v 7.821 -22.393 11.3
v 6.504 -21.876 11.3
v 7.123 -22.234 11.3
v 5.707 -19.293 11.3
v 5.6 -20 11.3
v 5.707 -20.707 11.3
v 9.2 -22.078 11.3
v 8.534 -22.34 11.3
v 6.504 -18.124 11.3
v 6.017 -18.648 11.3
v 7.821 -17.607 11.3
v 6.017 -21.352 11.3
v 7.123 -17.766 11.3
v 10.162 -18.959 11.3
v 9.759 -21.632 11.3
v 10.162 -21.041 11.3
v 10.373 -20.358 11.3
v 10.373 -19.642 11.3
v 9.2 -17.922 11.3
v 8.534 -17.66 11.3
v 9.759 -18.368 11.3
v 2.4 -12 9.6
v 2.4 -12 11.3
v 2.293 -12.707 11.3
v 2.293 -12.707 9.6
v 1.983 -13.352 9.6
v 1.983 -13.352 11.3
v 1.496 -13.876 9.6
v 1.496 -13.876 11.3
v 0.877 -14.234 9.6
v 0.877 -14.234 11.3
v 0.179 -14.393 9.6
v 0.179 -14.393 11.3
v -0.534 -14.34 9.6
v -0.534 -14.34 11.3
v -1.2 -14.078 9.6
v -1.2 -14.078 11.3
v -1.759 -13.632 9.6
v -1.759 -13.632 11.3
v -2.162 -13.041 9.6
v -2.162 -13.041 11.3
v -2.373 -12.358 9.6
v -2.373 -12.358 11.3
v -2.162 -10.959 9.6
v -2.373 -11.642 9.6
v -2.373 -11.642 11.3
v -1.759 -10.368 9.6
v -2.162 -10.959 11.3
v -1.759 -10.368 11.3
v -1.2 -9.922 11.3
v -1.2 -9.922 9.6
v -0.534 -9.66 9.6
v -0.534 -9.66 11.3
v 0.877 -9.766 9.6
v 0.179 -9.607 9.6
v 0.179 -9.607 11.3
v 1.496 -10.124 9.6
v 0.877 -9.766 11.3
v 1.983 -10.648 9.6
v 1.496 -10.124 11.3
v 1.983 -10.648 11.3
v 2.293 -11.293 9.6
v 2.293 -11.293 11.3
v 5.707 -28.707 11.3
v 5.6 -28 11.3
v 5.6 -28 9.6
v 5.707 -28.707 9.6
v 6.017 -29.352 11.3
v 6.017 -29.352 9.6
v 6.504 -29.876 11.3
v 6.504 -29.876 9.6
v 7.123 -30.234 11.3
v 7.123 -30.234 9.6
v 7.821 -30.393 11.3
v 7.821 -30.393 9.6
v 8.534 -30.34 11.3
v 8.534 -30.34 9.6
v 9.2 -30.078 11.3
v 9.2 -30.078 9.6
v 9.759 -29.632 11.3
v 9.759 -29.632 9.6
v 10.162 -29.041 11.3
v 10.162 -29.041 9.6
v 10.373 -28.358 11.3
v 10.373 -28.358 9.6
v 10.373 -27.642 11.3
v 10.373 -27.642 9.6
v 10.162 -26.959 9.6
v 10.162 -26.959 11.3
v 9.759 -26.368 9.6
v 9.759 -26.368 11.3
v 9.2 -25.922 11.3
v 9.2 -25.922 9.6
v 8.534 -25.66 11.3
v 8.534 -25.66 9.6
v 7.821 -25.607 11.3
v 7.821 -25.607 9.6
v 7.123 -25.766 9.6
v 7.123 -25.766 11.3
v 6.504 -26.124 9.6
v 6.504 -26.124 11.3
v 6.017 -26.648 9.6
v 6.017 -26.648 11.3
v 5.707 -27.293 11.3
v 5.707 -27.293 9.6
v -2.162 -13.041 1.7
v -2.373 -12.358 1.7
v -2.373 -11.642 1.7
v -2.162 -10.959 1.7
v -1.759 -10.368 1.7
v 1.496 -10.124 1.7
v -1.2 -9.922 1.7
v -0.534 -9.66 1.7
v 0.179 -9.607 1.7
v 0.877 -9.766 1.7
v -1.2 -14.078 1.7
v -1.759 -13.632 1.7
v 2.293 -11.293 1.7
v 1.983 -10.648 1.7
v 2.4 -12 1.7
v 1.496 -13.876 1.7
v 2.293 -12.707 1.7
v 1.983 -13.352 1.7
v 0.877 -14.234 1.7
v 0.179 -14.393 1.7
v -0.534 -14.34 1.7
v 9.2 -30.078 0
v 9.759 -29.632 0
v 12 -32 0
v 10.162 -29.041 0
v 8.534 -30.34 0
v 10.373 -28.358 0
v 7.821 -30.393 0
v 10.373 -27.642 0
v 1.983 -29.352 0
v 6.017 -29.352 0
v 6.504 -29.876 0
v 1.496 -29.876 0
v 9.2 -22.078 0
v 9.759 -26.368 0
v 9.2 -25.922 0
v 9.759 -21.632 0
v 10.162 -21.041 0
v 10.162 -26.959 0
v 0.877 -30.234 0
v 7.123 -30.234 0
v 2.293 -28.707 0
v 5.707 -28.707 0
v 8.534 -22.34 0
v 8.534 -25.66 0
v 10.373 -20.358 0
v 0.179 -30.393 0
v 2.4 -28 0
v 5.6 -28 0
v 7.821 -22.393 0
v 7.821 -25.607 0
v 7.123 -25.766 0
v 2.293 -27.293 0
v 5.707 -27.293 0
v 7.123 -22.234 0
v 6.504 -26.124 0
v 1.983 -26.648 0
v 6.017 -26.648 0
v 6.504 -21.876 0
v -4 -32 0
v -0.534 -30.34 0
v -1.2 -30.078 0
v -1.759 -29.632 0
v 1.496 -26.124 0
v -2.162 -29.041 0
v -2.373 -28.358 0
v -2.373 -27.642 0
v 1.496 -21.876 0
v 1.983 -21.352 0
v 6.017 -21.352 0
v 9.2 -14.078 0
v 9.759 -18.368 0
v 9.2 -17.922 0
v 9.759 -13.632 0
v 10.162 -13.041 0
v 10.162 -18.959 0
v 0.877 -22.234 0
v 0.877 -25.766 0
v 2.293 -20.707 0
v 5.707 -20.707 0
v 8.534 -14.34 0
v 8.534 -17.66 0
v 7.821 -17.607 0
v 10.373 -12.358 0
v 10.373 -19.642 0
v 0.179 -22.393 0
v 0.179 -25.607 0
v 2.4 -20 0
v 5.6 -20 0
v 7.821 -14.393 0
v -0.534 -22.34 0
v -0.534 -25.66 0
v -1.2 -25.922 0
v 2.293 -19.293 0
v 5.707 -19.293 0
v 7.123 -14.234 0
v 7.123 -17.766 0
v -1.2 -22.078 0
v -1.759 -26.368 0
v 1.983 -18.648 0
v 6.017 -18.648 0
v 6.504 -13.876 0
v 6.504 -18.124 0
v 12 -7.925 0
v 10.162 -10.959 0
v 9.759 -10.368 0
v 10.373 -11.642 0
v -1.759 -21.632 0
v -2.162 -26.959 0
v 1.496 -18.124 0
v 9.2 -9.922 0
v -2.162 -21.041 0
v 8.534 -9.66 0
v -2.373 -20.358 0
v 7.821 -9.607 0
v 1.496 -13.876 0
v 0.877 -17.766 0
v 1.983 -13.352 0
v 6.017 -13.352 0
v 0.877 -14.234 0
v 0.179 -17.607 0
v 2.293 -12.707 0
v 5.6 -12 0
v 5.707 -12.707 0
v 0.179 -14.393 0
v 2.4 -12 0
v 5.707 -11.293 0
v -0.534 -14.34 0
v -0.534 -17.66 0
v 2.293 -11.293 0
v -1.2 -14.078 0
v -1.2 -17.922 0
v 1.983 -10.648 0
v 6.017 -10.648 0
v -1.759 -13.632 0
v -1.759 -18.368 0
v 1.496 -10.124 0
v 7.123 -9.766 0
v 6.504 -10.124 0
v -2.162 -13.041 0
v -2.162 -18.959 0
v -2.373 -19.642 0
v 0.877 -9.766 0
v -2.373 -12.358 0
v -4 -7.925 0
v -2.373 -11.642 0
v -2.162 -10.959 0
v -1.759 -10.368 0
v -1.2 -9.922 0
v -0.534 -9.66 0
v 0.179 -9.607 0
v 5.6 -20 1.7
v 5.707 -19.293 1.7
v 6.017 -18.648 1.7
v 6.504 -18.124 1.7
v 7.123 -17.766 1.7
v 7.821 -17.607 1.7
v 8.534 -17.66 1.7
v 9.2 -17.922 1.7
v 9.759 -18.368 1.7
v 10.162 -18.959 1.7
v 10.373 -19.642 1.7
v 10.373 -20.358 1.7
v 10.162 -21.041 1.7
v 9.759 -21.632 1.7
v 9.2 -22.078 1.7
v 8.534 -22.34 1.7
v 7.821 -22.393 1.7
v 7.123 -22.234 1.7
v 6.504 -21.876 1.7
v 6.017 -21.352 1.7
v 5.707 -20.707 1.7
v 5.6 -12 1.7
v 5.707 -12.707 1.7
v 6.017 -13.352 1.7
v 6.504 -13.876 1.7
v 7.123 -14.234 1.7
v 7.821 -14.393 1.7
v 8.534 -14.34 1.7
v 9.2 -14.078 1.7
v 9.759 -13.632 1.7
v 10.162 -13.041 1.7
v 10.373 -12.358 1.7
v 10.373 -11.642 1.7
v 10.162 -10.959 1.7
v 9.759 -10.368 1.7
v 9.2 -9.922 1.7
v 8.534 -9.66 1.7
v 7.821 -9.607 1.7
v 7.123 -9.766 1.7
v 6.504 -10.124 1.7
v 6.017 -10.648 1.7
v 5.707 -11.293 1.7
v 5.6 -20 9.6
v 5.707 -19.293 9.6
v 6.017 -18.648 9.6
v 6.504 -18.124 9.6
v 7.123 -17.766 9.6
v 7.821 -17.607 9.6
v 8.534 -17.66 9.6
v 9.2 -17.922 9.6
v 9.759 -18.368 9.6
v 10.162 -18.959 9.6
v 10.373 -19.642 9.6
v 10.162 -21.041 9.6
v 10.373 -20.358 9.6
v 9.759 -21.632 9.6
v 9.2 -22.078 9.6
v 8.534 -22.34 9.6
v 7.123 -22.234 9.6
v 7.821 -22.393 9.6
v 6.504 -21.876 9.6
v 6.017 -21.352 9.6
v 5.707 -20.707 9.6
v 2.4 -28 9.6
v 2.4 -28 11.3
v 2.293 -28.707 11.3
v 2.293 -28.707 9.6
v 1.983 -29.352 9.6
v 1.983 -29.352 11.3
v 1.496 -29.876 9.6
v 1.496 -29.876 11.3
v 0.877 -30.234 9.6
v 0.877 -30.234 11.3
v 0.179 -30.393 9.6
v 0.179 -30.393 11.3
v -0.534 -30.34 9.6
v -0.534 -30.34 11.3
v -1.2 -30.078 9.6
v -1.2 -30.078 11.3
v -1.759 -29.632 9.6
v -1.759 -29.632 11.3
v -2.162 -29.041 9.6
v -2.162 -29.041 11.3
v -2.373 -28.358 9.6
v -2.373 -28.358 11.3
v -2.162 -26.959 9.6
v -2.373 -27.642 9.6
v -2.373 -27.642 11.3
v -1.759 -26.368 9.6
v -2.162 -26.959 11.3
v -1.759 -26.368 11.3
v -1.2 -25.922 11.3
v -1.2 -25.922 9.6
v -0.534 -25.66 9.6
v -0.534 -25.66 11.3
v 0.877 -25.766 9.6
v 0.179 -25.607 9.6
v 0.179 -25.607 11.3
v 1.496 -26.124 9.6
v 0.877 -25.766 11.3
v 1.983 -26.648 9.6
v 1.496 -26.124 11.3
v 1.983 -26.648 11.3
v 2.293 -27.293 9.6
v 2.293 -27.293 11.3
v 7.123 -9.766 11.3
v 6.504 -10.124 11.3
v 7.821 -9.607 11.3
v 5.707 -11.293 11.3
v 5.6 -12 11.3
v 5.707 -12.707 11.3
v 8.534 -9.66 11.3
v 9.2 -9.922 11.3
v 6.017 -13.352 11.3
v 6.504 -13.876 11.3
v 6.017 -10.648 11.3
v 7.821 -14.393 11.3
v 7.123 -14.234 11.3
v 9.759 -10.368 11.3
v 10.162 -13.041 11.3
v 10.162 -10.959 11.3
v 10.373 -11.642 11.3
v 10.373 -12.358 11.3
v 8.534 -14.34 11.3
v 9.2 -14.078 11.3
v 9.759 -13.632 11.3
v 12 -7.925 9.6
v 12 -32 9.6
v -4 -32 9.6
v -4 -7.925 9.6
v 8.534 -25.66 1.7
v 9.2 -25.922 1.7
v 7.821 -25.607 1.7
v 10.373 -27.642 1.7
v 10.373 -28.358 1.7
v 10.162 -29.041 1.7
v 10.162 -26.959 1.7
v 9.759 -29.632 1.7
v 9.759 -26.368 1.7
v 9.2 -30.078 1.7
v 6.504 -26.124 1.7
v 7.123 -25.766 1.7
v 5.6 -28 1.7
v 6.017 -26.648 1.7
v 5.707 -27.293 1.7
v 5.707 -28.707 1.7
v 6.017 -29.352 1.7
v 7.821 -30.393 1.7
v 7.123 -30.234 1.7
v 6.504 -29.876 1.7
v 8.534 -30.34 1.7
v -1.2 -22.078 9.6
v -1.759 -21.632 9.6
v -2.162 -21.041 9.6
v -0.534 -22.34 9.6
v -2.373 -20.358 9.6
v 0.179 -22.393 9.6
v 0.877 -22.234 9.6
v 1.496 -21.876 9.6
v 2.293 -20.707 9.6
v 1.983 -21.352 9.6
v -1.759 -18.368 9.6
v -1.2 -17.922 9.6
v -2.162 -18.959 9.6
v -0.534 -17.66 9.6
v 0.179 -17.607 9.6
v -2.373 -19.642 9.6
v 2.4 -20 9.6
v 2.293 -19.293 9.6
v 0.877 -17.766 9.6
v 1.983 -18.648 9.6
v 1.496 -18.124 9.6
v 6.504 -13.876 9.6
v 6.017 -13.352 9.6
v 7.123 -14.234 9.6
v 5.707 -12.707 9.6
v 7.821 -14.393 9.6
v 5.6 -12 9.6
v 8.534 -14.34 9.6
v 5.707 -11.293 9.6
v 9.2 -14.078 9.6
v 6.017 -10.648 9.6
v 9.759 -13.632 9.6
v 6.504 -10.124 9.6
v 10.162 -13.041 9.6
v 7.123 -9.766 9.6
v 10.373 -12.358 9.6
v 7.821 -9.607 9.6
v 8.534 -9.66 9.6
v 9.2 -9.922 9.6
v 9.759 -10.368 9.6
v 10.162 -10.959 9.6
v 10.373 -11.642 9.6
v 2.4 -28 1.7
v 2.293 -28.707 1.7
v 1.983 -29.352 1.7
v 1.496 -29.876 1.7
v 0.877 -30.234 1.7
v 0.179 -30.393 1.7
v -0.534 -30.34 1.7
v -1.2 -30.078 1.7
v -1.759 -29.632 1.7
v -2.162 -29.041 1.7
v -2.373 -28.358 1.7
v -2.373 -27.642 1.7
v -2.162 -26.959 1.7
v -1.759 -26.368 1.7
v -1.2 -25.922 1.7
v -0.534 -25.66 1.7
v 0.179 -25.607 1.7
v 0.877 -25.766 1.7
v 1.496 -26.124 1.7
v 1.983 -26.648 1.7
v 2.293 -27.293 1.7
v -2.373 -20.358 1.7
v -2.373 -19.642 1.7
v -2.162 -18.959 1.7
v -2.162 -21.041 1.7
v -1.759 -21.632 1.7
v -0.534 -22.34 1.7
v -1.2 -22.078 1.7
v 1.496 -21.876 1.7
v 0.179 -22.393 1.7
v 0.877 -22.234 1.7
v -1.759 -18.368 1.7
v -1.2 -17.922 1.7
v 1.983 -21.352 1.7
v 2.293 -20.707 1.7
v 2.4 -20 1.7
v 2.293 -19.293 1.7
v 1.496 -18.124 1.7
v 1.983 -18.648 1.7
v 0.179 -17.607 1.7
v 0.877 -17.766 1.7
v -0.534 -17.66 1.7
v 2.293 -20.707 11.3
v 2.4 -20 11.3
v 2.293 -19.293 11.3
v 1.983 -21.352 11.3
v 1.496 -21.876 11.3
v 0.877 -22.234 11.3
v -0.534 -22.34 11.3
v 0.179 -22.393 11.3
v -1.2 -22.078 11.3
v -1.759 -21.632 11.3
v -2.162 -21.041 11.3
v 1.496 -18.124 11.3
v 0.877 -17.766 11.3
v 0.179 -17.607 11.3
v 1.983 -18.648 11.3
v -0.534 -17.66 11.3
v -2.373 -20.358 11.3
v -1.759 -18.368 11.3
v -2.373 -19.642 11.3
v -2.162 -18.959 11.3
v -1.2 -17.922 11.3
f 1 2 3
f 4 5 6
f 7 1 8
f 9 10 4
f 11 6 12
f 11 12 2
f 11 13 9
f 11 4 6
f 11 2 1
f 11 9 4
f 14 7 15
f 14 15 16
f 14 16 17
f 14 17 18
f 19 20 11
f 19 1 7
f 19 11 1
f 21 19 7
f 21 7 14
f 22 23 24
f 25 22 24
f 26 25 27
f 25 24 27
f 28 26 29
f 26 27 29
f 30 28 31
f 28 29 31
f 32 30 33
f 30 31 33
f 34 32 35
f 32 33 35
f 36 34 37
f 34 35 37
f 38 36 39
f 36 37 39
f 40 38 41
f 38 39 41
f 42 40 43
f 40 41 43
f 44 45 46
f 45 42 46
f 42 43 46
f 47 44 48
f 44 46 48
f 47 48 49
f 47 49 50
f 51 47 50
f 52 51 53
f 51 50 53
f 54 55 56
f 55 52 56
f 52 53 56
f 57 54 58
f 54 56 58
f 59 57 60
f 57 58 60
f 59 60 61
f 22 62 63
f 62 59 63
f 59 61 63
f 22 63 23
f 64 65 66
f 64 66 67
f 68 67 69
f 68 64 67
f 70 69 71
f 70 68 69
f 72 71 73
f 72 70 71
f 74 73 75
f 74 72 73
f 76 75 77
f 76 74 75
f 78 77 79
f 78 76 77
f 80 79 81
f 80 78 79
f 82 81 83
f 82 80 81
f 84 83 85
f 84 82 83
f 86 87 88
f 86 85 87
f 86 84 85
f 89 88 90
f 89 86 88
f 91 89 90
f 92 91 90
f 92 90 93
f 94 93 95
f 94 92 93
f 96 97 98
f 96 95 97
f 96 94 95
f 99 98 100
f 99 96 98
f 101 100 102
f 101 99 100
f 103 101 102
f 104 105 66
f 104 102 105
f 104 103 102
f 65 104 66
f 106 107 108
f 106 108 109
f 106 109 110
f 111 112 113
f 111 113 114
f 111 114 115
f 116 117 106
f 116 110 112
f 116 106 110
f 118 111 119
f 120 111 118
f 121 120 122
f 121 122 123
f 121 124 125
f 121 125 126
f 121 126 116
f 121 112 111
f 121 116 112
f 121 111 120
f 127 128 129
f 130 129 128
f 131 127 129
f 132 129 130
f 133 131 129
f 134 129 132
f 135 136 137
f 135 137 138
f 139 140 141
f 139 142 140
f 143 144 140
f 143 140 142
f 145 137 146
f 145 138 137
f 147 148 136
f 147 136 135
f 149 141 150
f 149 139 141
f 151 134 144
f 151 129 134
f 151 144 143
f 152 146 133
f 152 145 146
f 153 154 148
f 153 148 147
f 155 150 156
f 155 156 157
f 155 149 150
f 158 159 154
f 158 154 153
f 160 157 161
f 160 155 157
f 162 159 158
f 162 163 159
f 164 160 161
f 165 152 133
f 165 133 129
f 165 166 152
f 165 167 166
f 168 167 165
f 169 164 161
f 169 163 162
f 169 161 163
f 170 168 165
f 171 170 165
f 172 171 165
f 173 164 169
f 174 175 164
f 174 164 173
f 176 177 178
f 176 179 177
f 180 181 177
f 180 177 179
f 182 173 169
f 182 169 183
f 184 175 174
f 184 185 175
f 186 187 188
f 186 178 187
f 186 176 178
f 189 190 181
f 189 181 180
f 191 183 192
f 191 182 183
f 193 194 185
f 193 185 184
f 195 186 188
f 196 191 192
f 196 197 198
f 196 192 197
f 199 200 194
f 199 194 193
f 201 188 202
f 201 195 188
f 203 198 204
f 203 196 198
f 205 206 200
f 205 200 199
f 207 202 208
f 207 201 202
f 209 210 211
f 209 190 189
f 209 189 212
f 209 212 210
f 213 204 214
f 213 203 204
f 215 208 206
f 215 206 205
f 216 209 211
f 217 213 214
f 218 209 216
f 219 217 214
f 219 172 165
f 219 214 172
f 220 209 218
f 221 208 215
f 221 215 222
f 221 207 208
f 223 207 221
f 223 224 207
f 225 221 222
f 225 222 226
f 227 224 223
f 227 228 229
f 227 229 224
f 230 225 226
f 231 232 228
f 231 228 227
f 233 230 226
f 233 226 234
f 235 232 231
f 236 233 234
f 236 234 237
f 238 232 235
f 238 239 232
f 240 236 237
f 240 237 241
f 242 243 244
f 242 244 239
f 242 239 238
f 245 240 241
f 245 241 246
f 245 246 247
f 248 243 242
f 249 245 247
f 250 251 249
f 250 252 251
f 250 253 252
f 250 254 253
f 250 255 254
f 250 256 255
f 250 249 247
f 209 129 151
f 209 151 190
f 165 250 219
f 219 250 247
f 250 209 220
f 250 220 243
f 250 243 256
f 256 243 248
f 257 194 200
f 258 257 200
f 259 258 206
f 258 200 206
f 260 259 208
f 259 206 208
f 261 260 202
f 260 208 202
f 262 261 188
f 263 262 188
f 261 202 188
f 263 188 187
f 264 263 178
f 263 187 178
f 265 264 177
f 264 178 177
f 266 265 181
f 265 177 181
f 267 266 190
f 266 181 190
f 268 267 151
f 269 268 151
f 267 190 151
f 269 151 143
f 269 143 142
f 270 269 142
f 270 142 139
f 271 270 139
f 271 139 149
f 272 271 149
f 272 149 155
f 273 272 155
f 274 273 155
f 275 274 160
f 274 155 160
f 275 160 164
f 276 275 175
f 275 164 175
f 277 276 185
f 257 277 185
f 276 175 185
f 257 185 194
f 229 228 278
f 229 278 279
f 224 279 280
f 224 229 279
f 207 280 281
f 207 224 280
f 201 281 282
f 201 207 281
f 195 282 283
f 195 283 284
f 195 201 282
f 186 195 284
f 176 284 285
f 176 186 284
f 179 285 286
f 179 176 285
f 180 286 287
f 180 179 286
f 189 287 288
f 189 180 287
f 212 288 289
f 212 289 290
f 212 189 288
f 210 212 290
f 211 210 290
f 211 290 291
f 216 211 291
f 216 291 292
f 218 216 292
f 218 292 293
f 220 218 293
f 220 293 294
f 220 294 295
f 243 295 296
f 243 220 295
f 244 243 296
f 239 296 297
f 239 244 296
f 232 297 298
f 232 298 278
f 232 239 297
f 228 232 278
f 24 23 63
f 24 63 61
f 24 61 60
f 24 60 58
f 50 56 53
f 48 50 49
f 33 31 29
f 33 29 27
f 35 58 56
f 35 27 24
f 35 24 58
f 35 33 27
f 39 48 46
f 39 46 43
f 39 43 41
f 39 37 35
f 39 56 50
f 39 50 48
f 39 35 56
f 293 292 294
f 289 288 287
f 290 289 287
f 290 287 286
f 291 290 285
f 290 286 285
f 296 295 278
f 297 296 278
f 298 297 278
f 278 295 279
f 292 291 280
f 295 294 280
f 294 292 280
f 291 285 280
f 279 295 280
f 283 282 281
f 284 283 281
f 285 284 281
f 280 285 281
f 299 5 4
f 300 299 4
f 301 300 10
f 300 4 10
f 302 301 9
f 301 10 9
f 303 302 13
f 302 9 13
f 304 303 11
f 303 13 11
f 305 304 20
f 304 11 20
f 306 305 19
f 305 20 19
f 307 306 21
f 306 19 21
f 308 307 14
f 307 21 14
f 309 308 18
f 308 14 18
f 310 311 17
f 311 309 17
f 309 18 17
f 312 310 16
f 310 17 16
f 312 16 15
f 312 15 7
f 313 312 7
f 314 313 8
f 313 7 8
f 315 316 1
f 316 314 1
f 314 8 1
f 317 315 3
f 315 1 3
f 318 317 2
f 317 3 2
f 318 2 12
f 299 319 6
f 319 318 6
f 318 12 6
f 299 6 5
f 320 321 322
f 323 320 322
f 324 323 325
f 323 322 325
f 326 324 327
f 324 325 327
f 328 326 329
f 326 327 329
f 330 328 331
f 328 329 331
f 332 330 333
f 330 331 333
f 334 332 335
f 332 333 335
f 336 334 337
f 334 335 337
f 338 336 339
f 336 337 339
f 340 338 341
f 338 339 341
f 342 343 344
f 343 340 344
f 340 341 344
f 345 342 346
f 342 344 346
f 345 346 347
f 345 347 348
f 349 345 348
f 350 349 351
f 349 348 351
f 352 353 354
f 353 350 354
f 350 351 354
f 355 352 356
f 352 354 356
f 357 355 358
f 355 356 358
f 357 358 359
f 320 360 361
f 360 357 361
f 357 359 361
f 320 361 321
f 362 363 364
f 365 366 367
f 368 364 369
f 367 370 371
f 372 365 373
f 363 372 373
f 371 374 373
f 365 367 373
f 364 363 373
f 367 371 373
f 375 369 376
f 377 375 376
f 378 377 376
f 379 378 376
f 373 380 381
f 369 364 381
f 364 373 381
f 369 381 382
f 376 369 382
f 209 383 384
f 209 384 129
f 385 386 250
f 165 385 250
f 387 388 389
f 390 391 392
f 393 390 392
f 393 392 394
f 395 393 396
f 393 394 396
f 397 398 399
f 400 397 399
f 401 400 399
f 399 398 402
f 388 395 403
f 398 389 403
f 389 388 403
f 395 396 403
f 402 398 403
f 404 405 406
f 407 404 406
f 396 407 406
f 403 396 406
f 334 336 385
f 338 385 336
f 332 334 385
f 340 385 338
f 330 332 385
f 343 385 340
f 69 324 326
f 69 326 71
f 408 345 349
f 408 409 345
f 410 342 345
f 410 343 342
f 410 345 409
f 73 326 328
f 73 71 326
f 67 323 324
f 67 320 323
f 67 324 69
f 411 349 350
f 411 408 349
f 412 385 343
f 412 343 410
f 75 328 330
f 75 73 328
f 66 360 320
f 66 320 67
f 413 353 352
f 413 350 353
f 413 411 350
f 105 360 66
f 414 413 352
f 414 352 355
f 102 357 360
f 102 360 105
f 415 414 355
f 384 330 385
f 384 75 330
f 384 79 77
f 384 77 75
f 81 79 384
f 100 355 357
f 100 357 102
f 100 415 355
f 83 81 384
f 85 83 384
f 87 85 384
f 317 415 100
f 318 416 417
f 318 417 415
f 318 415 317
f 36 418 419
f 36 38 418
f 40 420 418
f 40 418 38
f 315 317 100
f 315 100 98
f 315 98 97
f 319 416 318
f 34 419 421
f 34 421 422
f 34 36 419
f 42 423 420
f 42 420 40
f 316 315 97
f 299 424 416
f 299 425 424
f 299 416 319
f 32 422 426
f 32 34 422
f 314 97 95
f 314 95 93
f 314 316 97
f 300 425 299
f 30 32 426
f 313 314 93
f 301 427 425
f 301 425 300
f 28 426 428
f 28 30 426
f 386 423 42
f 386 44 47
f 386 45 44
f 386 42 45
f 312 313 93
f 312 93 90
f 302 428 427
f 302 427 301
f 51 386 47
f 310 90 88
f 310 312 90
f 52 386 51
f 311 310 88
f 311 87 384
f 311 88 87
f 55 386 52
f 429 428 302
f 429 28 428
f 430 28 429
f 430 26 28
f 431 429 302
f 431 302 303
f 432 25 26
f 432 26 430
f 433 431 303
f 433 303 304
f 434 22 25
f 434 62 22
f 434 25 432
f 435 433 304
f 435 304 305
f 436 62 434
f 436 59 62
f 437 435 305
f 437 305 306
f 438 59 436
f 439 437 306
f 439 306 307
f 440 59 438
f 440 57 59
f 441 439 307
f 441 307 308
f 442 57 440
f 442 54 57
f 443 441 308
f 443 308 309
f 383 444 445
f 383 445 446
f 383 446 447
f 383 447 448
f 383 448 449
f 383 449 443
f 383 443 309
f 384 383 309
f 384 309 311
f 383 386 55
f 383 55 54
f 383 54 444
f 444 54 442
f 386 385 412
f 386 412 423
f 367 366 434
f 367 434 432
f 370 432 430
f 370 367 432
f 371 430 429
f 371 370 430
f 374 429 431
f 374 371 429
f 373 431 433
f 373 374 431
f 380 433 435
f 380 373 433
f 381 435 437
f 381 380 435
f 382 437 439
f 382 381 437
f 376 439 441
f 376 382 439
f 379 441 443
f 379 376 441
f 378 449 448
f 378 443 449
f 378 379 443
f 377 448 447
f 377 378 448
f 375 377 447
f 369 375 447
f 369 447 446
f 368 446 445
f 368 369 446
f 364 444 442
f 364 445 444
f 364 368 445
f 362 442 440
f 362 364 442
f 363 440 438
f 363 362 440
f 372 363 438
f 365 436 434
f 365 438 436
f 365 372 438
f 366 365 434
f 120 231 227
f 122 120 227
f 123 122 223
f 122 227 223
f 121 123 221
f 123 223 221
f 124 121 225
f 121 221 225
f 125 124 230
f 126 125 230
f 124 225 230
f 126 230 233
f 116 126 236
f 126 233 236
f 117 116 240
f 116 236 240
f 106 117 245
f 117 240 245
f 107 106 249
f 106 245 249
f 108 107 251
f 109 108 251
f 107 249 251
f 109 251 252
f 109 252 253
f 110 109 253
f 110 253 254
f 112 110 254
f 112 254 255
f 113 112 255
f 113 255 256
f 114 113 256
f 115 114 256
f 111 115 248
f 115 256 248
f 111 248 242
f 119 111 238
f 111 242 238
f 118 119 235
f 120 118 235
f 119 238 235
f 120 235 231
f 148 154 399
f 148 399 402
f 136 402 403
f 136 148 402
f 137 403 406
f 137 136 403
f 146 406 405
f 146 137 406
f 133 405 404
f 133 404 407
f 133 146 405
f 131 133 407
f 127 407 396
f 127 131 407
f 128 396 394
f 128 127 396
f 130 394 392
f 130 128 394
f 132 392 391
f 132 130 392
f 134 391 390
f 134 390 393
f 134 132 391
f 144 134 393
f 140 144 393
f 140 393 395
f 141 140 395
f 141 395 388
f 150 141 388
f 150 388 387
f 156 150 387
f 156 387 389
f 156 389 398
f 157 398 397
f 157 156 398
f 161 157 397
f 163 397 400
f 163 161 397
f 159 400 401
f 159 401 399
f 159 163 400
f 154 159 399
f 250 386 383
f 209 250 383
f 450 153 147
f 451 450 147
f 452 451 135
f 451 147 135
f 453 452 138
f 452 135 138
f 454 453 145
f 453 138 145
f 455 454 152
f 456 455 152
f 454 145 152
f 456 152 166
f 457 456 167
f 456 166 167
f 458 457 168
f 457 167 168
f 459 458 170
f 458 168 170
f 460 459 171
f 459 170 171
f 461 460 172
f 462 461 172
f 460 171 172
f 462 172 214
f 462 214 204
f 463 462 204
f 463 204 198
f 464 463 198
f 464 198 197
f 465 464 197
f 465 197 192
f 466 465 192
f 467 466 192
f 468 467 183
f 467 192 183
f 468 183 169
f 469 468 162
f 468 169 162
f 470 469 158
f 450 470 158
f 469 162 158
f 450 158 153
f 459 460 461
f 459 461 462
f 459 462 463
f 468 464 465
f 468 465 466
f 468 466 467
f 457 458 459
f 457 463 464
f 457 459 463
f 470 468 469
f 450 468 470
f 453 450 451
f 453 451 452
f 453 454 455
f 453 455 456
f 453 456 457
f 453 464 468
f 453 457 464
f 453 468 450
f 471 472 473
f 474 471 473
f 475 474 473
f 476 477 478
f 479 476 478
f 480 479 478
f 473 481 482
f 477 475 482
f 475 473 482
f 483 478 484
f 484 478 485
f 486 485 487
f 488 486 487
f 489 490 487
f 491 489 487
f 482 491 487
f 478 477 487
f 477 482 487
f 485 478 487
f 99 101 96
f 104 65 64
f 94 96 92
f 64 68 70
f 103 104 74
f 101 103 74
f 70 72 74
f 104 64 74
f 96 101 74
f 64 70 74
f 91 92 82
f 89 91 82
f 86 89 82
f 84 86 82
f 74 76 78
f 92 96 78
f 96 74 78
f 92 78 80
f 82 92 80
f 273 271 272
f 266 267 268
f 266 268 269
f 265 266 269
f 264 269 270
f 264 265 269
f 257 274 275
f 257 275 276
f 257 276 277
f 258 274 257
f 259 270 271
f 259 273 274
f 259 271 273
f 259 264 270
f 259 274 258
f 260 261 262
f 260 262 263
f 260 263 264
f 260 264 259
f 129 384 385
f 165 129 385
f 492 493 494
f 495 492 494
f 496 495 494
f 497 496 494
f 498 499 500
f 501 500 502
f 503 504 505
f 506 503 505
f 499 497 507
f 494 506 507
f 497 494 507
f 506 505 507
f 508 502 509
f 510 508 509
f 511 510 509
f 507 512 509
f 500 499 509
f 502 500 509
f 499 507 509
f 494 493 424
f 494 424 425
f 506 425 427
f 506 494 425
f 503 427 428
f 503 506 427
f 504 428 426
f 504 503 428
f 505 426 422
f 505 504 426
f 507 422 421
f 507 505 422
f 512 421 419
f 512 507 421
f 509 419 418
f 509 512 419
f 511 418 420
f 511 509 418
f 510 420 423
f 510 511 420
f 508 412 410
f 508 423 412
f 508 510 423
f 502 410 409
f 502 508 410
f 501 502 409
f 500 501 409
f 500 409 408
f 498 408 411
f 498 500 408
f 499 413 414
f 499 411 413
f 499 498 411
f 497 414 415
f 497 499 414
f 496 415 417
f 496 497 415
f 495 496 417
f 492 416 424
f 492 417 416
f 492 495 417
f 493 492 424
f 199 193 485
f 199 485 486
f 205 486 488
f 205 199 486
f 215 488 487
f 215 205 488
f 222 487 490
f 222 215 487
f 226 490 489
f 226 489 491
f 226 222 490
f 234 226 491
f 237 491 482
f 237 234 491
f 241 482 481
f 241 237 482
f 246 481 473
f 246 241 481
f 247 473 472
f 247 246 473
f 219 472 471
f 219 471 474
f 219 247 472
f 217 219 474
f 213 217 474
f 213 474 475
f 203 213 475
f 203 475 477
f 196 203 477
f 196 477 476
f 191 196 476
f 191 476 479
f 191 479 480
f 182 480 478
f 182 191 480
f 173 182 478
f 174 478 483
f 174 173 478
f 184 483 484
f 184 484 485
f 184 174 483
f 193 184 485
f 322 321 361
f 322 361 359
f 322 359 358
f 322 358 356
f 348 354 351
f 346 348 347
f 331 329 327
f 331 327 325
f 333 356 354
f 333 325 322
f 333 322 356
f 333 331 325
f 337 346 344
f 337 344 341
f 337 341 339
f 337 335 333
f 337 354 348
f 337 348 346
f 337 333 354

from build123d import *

# Parameters (mm, degrees)
F1_DEPTH  = 8
F3_W      = 8
F3_H      = 8
F3_R      = 2.4
F4_DEPTH  = 1.7
F5_R      = 2.4
F6_DEPTH  = 1.7
F11_W     = 31.0510899872
F11_H     = 25.4
F12_DEPTH = 7.9248


with BuildPart() as f1:
    # F0 (on Front) → F1 (new body)
    with BuildSketch(Plane.XZ):
        Polygon((-2.4, 9.6), (-4, 9.6), (-4, 0), (4, 0), (4, 9.6), (2.4, 9.6), (2.4, 11.3), (-2.4, 11.3), align=None)
    extrude(amount=F1_DEPTH)

    # F3 (on plane+point) → F4 (cut, through all)
    with BuildSketch(Plane.XY.offset(11.3)):
        with Locations((0, -4)):
            Rectangle(F3_W, F3_H)
        with Locations((0, -4)):
            Circle(F3_R, mode=Mode.SUBTRACT)
    extrude(amount=-F4_DEPTH, mode=Mode.SUBTRACT)

    # F5 (on Top) → F6 (cut)
    with BuildSketch(Plane.XY):
        with Locations((0, -4)):
            Circle(F5_R)
    extrude(amount=F6_DEPTH, mode=Mode.SUBTRACT)

    # F8: F1 across plane


with BuildPart() as f1_1:
    add(f1.part)
    add(f1.part.mirror(Plane.YZ.offset(4)))

    # F9: F1 across face


with BuildPart() as f1_2:
    add(f1_1.part)
    add(f1_1.part.mirror(Plane(origin=(4, -8, 4.8), x_dir=(1, 0, 0), z_dir=(0, -1, 0))))

    # F10: F1 across face


with BuildPart() as f1_3:
    add(f1_2.part)
    add(f1_2.part.mirror(Plane(origin=(4, -16, 4.8), x_dir=(1, 0, 0), z_dir=(0, -1, 0))))

    # F11 (on Front) → F12 (cut)
    with BuildSketch(Plane.XZ):
        with Locations((3.3294046298, 0)):
            Rectangle(F11_W, F11_H)
    extrude(amount=F12_DEPTH, mode=Mode.SUBTRACT)


solid = f1_3.part
